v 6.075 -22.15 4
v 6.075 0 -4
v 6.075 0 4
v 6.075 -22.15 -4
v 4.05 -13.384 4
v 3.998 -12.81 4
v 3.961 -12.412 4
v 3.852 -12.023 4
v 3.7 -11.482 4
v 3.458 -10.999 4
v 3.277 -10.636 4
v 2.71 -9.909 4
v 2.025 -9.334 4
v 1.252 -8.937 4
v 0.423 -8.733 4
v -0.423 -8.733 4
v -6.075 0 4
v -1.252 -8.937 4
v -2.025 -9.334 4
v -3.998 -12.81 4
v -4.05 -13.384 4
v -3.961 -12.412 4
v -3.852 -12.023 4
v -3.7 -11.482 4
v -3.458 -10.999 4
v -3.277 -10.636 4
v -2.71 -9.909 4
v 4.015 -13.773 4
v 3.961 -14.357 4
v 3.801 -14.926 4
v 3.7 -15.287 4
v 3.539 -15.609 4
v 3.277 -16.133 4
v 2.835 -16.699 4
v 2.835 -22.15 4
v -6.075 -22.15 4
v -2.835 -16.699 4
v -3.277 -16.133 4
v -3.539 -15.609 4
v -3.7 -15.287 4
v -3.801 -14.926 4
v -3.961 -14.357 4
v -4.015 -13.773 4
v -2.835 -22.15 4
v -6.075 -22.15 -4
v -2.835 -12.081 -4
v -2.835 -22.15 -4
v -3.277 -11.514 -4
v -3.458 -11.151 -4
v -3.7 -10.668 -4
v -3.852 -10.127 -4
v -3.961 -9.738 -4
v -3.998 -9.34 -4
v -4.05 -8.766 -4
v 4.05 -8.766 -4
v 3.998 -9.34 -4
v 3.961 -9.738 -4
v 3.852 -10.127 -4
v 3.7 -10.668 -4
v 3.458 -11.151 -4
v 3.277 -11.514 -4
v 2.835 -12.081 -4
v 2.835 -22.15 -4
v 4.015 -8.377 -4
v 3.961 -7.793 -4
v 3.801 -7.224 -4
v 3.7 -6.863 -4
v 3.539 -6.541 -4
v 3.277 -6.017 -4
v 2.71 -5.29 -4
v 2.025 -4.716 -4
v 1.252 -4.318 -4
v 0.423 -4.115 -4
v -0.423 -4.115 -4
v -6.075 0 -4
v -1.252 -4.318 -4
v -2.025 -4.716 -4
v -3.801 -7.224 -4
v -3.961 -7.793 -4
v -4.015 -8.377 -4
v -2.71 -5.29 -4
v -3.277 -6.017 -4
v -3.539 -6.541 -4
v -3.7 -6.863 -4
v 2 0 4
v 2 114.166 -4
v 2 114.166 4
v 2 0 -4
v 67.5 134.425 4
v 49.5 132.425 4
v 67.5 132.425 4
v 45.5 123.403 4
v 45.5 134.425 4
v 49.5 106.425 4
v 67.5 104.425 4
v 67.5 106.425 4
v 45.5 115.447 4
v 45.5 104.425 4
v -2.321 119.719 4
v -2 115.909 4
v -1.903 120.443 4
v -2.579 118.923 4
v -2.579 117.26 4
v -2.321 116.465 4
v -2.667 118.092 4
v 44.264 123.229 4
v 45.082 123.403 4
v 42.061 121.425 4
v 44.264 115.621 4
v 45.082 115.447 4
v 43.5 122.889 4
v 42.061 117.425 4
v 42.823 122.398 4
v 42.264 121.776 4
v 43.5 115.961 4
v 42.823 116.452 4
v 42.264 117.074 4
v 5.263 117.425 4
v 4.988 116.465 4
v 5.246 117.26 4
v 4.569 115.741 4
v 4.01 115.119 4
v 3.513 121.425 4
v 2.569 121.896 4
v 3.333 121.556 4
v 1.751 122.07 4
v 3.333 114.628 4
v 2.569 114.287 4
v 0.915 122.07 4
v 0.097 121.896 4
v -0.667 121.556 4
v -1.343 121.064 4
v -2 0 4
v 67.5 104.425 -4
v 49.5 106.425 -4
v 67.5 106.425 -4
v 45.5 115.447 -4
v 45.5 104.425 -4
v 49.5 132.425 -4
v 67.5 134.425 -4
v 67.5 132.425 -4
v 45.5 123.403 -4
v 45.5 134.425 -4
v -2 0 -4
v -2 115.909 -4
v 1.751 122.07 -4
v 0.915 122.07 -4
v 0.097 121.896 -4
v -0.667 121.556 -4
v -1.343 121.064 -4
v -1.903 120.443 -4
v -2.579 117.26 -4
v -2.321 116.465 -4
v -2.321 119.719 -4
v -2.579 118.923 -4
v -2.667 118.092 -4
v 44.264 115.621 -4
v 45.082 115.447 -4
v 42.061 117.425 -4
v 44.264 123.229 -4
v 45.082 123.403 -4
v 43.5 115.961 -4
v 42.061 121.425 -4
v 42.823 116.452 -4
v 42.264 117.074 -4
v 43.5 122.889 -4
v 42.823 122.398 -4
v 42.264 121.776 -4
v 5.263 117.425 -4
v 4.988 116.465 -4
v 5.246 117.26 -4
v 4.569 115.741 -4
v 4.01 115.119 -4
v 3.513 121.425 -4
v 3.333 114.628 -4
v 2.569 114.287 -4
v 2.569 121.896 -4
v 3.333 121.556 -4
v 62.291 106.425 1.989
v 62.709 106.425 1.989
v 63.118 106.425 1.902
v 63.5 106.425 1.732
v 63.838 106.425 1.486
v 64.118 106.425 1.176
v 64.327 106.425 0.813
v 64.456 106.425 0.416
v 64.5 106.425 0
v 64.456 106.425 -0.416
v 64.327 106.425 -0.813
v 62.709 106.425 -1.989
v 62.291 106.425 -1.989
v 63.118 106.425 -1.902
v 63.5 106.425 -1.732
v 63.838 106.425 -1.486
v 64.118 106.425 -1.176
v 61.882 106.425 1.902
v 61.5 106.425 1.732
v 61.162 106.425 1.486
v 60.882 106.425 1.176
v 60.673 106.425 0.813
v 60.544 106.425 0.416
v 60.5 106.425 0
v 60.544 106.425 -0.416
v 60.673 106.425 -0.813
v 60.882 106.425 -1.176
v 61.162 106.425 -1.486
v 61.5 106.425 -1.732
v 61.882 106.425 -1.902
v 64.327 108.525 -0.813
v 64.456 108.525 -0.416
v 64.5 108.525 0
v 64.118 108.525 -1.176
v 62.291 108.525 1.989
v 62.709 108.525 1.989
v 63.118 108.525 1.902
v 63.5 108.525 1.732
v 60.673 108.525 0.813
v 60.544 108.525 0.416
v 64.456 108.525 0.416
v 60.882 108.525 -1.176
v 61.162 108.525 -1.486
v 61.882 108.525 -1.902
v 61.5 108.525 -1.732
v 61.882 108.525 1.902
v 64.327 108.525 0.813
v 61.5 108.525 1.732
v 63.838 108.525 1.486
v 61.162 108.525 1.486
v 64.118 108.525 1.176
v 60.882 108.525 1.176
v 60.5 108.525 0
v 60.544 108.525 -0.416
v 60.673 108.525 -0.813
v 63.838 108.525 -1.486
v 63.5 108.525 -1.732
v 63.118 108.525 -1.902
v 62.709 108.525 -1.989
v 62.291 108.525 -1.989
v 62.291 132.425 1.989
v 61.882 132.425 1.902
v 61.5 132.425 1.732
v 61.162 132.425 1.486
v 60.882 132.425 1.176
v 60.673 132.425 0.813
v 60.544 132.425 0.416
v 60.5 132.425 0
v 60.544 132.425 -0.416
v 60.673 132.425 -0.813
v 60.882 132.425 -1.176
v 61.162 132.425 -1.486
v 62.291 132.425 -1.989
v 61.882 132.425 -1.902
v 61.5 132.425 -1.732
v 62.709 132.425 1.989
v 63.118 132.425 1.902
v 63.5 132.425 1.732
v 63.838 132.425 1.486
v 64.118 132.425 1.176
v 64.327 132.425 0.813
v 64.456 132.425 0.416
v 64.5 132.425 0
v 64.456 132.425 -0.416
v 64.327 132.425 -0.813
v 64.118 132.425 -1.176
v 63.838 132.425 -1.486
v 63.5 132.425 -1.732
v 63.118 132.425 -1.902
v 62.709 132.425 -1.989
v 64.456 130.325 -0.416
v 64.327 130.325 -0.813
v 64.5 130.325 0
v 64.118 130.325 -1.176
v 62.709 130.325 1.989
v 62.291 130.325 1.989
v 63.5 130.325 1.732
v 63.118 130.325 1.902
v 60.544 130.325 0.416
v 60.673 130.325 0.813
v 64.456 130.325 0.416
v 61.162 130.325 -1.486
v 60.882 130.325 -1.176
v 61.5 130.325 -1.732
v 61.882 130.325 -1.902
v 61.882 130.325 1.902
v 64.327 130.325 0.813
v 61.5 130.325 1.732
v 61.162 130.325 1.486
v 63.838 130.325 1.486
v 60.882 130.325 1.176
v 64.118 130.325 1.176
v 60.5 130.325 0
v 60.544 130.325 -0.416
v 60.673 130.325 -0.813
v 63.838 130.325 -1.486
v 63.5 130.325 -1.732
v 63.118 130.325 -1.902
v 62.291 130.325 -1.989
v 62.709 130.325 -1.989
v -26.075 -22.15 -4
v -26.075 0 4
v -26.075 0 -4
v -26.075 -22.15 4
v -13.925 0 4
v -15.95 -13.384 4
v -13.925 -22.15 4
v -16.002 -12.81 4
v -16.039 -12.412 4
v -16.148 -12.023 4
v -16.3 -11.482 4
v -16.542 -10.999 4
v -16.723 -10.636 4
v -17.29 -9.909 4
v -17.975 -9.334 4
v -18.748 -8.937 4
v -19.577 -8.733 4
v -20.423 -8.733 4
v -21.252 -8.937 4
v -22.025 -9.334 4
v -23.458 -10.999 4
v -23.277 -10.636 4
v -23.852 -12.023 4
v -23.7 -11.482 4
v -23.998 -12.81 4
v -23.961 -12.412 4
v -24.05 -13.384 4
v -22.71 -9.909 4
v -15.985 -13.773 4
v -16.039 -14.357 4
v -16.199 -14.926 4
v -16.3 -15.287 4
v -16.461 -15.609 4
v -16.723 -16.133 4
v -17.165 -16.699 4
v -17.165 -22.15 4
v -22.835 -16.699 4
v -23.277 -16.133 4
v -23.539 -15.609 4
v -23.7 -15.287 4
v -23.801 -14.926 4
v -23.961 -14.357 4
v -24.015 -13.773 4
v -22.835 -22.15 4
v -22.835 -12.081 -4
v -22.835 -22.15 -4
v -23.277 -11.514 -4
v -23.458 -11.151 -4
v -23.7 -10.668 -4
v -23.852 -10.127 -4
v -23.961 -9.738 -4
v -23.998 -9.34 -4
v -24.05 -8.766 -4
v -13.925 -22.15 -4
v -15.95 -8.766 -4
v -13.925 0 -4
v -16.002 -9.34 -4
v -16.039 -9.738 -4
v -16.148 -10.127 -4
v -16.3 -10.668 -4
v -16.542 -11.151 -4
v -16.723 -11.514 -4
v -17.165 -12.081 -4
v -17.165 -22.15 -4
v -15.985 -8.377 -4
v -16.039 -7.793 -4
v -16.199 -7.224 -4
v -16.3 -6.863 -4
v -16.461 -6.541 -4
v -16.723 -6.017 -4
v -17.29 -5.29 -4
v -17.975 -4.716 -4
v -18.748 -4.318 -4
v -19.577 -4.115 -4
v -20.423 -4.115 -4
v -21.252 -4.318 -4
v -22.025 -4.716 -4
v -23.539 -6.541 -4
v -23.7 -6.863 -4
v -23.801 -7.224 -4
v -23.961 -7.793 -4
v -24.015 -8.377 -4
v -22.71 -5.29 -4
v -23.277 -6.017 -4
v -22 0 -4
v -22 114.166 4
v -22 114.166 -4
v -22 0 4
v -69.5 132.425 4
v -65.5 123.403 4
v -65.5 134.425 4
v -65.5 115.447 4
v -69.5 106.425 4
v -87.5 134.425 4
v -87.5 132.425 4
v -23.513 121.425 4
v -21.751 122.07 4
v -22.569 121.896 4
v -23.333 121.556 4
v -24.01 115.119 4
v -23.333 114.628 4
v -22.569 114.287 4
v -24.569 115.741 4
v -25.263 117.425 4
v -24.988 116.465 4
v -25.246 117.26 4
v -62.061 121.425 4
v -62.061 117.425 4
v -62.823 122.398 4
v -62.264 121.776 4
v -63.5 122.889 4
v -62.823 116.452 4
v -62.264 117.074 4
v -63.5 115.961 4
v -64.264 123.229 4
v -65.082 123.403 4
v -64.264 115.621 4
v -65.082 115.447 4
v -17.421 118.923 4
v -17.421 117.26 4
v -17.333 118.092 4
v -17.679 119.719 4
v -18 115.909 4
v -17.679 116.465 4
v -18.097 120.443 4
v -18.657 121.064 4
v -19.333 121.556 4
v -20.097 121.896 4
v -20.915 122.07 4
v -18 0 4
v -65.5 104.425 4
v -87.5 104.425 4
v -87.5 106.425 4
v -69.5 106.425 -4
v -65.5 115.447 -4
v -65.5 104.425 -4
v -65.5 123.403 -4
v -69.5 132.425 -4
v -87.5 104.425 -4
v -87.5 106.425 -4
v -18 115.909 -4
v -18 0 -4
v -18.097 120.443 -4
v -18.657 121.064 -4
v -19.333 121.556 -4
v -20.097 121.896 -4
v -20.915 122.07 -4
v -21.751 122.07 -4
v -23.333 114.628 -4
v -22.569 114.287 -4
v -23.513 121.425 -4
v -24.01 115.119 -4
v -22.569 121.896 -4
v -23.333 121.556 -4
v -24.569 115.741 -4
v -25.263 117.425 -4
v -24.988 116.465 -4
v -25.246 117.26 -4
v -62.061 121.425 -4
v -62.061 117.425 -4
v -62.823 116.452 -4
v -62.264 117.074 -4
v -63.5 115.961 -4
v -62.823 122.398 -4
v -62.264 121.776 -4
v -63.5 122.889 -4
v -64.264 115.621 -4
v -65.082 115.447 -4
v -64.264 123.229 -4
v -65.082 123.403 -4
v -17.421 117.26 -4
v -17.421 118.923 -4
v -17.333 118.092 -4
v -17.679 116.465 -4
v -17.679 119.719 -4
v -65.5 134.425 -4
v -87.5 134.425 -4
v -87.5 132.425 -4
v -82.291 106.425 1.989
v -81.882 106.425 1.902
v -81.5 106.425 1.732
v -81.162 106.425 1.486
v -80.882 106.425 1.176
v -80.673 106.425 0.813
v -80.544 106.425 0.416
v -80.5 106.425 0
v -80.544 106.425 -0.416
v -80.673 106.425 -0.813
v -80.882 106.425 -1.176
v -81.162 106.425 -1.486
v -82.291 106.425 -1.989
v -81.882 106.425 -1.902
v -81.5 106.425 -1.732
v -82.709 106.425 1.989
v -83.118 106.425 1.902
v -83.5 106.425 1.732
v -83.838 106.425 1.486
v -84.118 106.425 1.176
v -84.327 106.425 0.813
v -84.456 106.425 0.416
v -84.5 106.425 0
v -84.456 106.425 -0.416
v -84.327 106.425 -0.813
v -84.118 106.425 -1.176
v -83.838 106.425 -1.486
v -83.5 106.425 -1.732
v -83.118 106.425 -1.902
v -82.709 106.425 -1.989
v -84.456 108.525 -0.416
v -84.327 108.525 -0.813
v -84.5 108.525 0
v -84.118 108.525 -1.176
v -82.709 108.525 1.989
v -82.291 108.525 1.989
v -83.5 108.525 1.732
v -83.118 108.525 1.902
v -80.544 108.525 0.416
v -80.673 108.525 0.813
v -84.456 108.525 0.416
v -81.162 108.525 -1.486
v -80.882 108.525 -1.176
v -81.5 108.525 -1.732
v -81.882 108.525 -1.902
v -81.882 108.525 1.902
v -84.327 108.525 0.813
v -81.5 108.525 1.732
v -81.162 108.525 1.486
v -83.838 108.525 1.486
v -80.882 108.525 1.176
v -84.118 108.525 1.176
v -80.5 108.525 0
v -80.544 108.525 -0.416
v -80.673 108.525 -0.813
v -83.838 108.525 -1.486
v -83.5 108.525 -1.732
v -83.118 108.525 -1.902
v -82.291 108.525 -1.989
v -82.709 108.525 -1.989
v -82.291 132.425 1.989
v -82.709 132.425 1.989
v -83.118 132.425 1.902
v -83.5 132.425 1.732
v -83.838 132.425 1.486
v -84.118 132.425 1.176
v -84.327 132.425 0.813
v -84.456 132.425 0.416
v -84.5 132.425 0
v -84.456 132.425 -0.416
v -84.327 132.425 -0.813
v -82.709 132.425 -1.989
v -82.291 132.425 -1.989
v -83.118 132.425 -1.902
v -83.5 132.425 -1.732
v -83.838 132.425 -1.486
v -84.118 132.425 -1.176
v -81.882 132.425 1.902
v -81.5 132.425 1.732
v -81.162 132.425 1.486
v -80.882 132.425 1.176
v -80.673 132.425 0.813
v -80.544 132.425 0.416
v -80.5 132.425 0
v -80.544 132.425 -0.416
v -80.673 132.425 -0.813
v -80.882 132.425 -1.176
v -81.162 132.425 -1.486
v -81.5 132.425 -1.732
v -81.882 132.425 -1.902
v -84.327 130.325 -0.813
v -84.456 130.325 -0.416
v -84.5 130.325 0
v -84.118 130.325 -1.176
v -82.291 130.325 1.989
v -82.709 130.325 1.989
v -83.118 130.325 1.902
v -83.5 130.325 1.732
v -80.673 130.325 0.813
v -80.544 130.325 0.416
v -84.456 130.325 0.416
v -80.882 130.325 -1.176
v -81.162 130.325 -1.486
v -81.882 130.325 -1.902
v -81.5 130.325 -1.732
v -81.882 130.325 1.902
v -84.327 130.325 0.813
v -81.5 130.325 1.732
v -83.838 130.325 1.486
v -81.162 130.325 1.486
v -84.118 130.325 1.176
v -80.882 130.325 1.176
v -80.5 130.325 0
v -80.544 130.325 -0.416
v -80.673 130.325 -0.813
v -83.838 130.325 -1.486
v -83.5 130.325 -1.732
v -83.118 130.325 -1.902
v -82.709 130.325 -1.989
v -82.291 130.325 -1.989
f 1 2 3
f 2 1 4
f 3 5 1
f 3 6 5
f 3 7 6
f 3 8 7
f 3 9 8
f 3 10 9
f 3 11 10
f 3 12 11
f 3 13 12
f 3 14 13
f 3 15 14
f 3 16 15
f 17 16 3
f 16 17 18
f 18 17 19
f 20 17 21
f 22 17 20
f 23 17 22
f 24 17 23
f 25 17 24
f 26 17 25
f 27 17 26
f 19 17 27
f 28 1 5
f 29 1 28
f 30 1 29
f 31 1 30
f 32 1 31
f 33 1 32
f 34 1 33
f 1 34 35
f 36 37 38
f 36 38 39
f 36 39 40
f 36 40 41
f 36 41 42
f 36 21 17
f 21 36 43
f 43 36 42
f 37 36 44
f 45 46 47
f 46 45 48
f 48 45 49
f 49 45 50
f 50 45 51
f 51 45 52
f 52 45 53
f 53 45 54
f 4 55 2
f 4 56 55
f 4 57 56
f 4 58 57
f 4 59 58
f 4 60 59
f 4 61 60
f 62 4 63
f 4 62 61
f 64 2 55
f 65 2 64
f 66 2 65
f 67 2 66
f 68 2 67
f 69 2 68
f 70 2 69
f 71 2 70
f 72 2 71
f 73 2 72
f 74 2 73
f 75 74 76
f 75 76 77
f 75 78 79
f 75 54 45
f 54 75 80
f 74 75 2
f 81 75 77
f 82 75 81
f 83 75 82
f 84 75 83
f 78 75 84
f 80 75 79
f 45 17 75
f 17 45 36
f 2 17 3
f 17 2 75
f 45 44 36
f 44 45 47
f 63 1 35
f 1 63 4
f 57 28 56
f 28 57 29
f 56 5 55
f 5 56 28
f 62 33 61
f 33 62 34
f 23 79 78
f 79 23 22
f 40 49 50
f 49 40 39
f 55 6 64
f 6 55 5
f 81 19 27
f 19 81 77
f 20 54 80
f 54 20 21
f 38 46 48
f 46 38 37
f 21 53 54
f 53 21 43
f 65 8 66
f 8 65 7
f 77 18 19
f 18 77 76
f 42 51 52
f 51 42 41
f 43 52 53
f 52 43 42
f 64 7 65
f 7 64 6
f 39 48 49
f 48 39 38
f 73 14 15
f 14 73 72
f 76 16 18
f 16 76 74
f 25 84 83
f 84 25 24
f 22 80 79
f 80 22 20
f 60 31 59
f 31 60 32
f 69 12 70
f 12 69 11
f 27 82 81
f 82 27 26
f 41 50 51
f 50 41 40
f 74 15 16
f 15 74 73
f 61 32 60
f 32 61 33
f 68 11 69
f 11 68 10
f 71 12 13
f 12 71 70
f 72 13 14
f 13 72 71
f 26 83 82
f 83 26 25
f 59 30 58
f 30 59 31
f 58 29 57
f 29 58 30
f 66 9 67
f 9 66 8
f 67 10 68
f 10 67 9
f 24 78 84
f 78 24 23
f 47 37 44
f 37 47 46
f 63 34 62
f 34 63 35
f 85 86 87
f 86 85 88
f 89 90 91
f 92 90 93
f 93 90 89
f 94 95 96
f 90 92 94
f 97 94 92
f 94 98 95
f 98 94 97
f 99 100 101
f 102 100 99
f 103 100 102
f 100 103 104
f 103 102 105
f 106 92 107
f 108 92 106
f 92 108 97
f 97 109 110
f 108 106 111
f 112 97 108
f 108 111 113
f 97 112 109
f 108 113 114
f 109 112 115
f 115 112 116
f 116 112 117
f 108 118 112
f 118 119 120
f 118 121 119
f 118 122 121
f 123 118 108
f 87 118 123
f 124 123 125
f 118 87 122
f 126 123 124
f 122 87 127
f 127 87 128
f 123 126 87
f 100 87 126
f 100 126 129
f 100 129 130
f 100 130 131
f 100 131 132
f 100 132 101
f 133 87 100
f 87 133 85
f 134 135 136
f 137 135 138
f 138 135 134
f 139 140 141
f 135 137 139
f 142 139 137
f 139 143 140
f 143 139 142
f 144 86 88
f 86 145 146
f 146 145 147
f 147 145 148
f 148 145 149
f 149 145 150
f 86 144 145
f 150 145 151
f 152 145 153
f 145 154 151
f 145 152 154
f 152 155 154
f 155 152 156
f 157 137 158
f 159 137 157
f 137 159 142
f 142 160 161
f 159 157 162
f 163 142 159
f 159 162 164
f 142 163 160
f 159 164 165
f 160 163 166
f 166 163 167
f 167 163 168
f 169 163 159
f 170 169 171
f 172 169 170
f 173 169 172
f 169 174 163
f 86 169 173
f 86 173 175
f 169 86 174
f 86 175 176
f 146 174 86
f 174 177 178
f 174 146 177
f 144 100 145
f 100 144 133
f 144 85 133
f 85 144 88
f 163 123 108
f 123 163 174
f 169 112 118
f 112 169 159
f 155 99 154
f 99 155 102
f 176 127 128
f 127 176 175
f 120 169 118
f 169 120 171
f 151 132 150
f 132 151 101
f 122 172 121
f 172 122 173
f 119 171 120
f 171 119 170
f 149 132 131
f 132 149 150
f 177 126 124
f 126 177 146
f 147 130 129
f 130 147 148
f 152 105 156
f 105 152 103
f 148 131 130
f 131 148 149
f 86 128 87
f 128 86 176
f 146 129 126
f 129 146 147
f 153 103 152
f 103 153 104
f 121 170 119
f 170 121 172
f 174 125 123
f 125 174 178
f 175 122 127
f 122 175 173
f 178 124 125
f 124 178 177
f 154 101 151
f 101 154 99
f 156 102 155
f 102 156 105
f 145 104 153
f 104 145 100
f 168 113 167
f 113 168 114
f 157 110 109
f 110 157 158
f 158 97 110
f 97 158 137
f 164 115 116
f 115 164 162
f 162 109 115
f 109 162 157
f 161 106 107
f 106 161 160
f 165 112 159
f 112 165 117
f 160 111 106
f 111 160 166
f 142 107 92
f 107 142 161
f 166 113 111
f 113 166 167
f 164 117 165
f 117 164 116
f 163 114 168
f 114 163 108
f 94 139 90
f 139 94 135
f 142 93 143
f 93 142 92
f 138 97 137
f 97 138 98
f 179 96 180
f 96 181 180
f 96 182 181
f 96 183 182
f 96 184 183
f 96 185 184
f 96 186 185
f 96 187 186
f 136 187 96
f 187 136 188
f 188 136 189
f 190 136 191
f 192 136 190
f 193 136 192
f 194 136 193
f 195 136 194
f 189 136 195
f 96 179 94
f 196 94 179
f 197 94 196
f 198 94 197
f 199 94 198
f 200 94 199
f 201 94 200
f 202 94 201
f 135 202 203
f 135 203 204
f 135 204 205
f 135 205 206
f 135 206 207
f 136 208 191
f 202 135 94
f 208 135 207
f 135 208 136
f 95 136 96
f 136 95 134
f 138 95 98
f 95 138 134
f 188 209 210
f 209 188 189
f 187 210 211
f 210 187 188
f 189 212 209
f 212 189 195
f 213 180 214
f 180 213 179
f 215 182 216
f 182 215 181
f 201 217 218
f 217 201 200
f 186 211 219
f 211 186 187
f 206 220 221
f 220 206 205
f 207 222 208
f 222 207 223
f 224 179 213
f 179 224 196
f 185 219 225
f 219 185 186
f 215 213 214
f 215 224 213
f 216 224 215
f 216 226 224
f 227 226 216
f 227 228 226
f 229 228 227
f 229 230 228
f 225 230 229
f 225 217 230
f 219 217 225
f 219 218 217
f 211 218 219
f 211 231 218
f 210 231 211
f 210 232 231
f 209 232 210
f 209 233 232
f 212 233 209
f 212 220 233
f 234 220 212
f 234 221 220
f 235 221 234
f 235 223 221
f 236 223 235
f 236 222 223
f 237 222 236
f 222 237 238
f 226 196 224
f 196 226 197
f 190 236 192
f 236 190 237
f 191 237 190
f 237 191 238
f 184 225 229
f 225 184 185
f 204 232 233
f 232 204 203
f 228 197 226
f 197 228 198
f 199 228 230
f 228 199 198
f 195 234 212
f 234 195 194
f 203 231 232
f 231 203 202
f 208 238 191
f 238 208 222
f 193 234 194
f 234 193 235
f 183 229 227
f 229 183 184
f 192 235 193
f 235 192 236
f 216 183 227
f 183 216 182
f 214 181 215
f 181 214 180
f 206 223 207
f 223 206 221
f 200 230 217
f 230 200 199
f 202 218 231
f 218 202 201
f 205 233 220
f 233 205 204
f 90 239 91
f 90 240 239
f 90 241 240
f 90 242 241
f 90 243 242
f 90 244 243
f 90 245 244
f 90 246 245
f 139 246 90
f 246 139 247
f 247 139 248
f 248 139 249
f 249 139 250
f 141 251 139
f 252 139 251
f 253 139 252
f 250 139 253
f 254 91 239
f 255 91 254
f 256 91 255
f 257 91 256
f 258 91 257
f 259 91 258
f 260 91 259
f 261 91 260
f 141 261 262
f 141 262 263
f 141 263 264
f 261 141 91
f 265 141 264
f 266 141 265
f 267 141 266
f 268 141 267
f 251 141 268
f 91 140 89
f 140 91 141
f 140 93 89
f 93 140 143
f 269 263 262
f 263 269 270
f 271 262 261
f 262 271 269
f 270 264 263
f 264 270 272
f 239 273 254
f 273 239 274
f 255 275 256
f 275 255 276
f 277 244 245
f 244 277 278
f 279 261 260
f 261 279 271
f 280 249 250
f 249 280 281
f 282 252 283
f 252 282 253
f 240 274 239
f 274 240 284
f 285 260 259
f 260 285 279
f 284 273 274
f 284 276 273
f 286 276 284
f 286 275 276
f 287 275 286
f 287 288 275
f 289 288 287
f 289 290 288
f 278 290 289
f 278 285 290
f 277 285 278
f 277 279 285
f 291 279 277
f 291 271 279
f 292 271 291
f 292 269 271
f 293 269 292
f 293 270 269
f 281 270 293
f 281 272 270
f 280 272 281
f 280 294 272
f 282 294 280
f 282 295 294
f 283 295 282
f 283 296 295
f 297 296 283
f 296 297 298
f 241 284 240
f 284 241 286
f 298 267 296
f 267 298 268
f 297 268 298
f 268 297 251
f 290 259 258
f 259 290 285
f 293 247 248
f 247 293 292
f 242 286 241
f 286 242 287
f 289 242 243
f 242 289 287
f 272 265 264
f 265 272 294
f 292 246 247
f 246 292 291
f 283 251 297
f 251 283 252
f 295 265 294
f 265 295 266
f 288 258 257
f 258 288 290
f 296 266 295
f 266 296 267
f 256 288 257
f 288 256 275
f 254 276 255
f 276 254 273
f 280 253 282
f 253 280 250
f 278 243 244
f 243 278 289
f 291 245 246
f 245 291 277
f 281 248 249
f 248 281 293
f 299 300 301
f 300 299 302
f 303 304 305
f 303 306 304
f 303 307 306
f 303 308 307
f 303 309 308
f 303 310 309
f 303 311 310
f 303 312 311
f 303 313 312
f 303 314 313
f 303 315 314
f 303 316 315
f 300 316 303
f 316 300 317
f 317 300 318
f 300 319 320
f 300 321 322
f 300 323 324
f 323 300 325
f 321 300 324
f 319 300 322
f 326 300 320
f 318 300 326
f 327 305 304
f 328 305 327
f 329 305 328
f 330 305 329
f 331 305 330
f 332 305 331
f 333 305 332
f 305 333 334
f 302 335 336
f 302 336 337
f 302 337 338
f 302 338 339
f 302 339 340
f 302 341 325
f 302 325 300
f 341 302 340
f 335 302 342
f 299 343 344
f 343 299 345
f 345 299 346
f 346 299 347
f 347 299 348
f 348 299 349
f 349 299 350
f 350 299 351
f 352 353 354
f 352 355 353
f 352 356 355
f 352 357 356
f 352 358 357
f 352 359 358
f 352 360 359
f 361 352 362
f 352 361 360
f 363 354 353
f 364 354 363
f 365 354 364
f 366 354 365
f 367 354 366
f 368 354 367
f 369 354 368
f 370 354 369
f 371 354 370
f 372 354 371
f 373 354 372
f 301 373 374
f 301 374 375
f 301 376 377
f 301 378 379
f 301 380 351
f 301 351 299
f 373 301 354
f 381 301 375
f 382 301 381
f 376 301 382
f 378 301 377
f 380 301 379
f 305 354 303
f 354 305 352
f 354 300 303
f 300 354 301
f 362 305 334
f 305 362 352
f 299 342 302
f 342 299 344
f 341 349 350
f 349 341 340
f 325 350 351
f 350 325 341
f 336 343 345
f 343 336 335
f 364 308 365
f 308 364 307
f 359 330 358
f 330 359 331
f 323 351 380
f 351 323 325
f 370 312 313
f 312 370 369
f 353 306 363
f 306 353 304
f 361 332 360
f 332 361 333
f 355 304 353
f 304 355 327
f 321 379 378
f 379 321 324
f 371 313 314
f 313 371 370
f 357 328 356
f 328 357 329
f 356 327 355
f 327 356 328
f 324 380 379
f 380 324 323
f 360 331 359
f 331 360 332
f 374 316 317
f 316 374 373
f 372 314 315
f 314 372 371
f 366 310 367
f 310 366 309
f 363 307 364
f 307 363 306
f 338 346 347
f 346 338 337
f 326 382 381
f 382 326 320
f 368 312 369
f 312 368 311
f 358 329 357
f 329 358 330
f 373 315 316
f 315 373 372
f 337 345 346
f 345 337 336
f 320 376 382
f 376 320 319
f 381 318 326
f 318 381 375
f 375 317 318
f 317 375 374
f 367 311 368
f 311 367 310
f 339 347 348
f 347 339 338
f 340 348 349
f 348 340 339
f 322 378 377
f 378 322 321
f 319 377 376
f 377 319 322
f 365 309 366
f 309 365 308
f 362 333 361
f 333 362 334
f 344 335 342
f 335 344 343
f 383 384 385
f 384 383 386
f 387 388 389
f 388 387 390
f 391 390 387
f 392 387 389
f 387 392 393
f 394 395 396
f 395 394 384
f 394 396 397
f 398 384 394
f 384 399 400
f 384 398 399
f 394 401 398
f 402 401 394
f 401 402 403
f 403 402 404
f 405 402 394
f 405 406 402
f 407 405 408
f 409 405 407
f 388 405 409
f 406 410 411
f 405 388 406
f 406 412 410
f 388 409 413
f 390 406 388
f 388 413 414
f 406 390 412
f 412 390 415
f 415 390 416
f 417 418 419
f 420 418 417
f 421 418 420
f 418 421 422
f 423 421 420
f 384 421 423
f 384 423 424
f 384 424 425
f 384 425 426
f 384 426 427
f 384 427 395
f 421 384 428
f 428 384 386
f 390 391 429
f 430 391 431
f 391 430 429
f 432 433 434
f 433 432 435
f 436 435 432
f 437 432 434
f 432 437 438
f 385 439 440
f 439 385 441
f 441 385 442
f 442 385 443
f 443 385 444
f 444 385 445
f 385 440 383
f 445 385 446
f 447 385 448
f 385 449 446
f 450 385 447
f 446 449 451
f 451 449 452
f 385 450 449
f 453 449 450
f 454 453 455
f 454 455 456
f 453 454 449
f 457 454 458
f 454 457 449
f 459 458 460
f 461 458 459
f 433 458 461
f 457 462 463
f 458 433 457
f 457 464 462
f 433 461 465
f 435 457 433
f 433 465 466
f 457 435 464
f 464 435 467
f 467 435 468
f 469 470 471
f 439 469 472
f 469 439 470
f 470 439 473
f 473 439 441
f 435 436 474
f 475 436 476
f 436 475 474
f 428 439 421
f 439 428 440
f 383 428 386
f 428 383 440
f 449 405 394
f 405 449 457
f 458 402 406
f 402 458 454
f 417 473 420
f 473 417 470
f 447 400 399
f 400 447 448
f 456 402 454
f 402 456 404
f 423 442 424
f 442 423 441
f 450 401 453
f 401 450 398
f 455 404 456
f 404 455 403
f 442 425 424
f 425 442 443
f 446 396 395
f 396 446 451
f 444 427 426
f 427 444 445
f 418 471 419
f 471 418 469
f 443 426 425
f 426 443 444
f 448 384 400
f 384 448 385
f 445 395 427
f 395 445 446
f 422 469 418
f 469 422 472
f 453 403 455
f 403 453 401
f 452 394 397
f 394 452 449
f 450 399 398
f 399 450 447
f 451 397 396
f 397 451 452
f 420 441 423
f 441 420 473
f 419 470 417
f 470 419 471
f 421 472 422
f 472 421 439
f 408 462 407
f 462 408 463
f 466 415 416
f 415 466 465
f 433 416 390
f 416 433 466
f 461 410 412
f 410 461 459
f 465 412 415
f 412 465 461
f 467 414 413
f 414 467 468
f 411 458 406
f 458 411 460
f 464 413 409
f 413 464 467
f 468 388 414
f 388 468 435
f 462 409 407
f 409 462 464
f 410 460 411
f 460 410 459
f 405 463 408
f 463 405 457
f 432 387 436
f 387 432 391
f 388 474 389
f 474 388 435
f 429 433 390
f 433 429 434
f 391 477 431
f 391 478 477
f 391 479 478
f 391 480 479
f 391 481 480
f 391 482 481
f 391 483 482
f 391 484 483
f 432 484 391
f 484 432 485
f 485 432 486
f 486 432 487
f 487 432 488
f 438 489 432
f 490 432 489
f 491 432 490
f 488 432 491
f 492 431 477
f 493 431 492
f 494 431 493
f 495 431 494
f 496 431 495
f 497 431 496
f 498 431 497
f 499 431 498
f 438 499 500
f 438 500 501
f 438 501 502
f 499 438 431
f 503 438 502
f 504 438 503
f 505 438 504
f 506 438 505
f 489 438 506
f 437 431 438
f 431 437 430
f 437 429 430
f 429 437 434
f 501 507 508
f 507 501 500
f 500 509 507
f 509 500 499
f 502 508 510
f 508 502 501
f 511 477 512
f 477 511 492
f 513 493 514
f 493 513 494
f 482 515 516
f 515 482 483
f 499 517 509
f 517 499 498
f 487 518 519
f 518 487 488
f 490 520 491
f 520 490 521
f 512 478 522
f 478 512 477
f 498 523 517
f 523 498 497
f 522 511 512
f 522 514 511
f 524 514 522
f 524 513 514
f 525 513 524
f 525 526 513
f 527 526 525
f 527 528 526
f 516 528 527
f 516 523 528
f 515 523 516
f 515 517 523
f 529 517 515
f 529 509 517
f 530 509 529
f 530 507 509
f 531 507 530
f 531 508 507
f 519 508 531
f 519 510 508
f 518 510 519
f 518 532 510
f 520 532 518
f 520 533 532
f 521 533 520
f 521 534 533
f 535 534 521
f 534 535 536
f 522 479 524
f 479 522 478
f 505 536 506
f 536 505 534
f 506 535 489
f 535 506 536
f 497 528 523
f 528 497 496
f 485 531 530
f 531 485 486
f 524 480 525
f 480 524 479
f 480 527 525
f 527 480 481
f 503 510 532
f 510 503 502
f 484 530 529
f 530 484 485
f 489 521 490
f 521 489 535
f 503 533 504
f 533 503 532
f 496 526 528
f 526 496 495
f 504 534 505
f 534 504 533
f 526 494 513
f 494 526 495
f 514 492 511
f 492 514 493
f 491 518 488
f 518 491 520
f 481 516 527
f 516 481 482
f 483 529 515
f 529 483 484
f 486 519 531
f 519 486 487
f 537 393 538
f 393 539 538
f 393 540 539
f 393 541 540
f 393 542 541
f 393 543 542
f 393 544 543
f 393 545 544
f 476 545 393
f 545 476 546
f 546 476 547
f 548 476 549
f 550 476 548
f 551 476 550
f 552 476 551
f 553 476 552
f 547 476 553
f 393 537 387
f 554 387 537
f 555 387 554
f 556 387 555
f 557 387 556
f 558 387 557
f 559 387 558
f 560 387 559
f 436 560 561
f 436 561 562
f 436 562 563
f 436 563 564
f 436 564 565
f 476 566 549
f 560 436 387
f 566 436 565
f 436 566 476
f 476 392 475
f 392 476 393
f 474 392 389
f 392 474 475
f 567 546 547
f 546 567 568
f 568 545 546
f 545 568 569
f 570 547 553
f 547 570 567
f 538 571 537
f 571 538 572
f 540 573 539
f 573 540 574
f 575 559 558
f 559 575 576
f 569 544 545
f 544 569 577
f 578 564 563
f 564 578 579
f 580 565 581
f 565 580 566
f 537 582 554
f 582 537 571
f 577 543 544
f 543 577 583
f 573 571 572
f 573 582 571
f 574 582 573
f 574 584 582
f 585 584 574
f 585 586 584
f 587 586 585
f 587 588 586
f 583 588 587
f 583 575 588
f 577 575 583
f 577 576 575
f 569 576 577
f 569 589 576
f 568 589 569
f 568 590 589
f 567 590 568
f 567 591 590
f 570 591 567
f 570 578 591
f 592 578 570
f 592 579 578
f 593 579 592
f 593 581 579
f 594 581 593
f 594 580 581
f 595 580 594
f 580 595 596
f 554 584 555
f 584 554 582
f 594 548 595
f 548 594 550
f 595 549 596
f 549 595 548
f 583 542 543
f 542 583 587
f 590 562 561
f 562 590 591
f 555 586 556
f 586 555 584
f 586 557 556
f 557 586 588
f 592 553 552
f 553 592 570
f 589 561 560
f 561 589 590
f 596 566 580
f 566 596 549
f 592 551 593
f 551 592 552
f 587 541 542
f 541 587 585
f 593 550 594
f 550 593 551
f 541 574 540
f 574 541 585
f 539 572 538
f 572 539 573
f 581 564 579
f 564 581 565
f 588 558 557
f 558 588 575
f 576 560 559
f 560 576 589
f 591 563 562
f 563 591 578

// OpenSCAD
//Rod Diameter
diameter=8.1 ;
//height of everything
height=8;
// Distance of the Fan from the middel of the Rod Y-direction
leangth=117.5;
//Distance of the mounting hole to the middel of the Rod in X direction ( not adjusted for clipangel different from 0)
width=62.5;
//angle of the Frame Rods, Mendel has 60° (change this to adjust the angle of the fan if you wnat to point it on the print bed)
rodangel=60;
//angle of the Clip, maybe you want to Fnas to mount like a V
clipangel=0;
//Ratio of the FrameMount Cutout
cutoutRatio=0.7;
//Fanwidth
fanwidth=26; 
//Leagth of the Grip arms, has to be smaller than width
gripleangth=17;


//making the grib module longer when changing the angel of the rod
mountleangth=diameter*1.5+cos(rodangel)*height*2.5;


module grip()
{
translate ([0,-(mountleangth)/2,0])difference()
	{	
	translate([-diameter*3/4,-mountleangth/2,-height/2]) //block
		cube([diameter*3/2,mountleangth,height]);
	
	rotate([-90-rodangel,0,0]) cylinder(h=height*6, r=diameter/2,center=true,$fn=30); //Rod Cutout
	rotate([-90-rodangel,0,0])translate([-diameter*cutoutRatio/2,0,-20]) cube([diameter*cutoutRatio, 40,40]); //Entry Cutout
	}
}

module arm()
{
translate([0,0,-height/2])union()
	{
	translate([-height/4,0,0])cube([height/2,leangth-mountleangth/2+fanwidth/2,height]);
	translate([0,leangth-mountleangth/2-height/4+fanwidth/2,0])cube([width-gripleangth,height/2,height]);
	translate([height/6,leangth-mountleangth/2-height/6+fanwidth/2,0]) cylinder(h=height,r=height/2,$fn=30 );
	translate([width-gripleangth,leangth-mountleangth/2+fanwidth/2,0]) cylinder(h=height,r=height/2,$fn=30 );
	}
}

module clip()
{ translate([width-gripleangth,leangth-mountleangth/2+fanwidth/2,0]) rotate([0,0,clipangel])union(){
mirror([0,1,0]) halfclip();
halfclip();
}}

module halfclip()
{
	translate([0,-(fanwidth)/2,-height/2])union()
	{
	cube([height/2,(fanwidth)/2,height]);
	translate([0,-height/4,0])cube([gripleangth+5,height/4,height]);
	translate([gripleangth, 0, height/2])rotate([-90,0,0])cylinder(h=2.1,r=2,$fn=30);
	}
	

}

module whole()
{union(){
grip();
arm();
clip();
}
}

whole();
translate([-20,0,0]) mirror([1,0,0]) whole();
